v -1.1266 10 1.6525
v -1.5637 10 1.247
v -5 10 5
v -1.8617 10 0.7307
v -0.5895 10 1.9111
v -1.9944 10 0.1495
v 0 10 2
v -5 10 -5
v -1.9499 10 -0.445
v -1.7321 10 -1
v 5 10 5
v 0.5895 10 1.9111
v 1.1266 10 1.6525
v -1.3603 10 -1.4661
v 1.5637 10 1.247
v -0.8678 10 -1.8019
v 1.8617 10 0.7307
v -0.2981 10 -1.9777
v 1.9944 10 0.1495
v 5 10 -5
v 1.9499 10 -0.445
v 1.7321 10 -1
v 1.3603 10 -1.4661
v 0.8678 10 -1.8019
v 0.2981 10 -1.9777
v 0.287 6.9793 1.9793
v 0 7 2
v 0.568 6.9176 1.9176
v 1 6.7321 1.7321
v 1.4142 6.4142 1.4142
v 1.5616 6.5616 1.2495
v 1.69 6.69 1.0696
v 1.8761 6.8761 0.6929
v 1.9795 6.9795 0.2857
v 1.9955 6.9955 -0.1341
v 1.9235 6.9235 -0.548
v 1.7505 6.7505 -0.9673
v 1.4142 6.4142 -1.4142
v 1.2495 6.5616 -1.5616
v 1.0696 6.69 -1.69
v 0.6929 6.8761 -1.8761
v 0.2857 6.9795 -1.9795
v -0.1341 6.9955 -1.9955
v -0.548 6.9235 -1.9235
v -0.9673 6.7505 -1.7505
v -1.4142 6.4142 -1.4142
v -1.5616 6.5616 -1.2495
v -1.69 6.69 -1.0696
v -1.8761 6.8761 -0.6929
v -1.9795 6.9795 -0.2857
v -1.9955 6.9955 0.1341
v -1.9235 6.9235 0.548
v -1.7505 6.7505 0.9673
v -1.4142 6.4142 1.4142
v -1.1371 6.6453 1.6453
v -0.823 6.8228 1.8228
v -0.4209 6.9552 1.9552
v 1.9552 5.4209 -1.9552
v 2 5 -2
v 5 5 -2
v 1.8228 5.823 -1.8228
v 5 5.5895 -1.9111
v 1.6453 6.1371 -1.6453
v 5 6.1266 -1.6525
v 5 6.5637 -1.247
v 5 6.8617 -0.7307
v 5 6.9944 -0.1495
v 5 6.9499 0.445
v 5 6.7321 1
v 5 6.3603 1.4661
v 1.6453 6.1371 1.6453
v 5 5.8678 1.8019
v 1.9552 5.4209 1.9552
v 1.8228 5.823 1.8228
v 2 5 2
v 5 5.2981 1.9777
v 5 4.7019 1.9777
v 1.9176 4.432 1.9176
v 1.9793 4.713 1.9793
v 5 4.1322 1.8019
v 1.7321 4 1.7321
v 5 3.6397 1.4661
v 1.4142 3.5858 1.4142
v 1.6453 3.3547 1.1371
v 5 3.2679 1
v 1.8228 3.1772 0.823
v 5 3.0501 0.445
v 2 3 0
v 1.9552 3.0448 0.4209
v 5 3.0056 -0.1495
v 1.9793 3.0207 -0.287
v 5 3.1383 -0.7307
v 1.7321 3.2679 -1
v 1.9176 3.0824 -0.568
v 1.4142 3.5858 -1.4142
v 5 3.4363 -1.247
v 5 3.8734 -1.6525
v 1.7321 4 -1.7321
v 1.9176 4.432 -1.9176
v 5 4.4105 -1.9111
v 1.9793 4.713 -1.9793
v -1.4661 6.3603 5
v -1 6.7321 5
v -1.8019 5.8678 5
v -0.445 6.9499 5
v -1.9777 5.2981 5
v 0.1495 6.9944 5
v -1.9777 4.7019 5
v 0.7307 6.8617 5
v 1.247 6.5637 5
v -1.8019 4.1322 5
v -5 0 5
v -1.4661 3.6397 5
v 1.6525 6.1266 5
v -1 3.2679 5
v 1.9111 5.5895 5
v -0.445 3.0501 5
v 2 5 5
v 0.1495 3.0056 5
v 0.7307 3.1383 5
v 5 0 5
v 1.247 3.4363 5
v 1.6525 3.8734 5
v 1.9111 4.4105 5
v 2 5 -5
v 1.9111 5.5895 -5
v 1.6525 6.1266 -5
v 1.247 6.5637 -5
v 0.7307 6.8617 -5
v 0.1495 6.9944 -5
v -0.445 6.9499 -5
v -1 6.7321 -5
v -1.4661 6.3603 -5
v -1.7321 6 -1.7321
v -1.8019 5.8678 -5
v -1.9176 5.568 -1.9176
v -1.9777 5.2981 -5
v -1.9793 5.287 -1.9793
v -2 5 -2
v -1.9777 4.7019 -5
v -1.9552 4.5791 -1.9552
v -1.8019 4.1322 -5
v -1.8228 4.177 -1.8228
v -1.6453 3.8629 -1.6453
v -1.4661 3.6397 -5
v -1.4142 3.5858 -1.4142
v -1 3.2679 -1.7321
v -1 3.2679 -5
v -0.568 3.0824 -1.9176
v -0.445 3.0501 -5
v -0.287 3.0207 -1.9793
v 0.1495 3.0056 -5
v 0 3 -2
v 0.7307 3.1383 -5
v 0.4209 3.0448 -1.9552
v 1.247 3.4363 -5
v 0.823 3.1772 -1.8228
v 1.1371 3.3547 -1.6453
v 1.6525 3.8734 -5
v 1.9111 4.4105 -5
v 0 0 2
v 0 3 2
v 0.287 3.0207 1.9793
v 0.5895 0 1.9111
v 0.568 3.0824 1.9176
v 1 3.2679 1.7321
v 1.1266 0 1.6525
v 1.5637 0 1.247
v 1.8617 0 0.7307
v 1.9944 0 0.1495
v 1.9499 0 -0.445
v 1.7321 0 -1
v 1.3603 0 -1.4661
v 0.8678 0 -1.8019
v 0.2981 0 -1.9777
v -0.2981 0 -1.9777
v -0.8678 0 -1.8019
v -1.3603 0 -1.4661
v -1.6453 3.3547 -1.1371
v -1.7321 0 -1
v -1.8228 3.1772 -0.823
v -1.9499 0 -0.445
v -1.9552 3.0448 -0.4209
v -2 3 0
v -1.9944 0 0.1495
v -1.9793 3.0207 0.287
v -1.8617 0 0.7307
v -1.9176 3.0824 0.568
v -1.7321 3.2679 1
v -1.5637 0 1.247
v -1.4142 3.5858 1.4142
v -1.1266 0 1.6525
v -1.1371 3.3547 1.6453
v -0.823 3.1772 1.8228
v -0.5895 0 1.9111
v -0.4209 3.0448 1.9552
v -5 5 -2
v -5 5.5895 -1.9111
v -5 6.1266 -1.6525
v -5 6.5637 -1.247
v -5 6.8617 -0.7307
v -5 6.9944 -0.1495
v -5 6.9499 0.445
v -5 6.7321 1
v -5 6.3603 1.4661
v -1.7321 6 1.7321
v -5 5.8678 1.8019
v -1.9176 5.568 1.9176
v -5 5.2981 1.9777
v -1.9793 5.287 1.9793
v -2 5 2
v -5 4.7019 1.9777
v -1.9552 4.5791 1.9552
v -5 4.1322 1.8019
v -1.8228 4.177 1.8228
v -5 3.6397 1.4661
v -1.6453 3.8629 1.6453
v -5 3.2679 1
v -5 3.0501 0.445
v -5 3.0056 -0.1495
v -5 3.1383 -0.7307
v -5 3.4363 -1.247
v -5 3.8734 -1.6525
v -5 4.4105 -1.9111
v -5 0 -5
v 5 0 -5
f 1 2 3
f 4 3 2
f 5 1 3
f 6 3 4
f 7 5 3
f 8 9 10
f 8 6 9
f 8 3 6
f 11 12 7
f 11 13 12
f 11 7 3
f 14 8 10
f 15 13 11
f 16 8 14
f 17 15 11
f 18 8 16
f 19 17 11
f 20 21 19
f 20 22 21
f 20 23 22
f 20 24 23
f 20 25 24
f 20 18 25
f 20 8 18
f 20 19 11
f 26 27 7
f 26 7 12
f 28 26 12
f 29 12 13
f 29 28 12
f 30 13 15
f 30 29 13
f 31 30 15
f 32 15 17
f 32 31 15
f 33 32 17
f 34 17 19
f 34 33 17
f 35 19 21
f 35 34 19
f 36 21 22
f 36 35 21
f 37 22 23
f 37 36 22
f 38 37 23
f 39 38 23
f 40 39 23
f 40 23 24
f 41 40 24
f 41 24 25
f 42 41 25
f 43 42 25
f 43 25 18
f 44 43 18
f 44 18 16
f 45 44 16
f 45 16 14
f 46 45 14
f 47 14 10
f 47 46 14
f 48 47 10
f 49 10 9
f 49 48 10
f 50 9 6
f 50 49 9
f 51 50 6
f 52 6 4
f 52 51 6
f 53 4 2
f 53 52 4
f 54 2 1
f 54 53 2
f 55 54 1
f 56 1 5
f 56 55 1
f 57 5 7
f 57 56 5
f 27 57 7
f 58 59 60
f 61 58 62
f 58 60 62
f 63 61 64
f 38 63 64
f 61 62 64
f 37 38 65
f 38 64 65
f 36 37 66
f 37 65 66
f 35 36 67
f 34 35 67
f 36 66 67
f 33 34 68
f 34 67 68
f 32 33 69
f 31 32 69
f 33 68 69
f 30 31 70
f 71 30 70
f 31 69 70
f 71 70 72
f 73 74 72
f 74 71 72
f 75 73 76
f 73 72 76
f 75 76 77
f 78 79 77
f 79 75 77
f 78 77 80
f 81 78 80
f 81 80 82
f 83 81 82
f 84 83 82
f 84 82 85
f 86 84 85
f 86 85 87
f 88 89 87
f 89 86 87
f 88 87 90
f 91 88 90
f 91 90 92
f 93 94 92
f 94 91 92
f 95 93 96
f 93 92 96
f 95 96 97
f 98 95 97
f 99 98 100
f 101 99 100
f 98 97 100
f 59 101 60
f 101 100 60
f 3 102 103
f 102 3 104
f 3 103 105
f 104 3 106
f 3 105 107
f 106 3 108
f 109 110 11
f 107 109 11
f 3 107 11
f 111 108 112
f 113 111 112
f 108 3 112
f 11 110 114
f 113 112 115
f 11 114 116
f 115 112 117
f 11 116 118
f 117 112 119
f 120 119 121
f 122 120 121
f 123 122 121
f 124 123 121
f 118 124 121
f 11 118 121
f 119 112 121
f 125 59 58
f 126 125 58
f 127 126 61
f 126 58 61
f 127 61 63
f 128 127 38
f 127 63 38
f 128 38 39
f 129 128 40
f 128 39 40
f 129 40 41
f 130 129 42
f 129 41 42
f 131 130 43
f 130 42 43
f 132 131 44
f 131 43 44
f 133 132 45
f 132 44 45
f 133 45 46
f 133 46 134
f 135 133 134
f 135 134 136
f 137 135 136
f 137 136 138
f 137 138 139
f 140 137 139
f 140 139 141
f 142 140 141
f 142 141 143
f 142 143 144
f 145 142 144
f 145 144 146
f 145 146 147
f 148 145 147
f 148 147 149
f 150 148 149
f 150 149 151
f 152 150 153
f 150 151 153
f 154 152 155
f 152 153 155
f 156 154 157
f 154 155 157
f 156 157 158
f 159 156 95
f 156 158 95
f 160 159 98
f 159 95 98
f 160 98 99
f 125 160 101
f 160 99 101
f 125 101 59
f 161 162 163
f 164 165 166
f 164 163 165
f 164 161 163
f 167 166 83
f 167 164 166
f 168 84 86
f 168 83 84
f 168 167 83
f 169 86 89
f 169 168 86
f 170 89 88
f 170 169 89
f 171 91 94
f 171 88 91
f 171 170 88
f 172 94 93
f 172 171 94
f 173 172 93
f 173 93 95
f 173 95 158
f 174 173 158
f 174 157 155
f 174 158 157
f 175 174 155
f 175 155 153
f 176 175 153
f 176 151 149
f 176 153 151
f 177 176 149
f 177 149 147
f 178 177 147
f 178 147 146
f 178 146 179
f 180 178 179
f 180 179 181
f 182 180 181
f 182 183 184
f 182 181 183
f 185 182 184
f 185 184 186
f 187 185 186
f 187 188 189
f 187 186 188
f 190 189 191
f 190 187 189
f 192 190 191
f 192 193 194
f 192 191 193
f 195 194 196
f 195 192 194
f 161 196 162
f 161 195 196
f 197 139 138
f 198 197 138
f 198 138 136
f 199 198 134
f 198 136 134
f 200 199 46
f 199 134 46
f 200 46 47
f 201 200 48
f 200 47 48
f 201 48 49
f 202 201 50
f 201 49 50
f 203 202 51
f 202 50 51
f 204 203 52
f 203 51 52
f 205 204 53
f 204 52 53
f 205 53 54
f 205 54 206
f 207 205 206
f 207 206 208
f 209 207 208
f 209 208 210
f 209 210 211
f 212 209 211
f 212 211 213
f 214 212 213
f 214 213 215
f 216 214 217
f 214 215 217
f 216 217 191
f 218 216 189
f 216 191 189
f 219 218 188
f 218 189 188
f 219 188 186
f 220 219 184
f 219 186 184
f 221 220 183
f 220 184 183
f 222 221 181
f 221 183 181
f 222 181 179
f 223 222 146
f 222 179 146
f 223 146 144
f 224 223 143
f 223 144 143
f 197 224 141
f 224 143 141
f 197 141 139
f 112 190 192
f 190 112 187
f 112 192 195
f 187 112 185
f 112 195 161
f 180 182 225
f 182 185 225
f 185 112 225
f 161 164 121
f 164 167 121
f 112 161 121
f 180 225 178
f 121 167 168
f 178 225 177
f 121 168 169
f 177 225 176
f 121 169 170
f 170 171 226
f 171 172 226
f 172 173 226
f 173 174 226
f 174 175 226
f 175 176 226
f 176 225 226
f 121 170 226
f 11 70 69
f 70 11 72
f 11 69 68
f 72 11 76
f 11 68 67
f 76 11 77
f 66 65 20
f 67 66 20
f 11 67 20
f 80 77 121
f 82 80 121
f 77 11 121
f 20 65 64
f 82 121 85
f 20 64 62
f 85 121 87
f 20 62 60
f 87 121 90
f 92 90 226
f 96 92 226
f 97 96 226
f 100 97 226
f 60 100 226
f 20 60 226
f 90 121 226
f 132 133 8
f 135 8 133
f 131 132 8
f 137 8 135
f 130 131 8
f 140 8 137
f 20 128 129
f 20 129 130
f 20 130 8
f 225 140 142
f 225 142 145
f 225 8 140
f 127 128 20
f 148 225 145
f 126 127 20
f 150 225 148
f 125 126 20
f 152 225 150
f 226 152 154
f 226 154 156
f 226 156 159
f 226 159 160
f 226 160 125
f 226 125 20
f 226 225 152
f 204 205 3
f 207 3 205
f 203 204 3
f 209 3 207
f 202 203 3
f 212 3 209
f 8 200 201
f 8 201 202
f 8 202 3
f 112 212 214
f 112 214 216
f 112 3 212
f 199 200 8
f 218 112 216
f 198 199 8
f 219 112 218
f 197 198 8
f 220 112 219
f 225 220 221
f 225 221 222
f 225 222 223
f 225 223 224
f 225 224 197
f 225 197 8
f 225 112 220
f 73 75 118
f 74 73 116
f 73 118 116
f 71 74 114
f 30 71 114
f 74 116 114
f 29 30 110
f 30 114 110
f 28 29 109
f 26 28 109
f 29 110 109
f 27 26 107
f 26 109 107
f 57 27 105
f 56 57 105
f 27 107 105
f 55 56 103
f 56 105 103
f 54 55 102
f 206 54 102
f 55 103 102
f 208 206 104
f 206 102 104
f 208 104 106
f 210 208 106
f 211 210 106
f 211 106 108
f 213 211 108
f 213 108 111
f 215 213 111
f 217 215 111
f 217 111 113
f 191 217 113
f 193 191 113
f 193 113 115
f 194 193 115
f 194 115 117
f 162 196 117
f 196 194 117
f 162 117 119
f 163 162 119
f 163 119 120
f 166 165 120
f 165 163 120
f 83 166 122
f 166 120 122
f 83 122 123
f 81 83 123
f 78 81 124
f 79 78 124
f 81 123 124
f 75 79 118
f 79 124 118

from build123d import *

# Parameters (mm, degrees)
SKETCH_1_W          = 10
SKETCH_1_H          = 10
SKETCH_1_R          = 2
EXTRUDE_1_DEPTH     = 10
SKETCH_2_R          = 2
CUT_EXTRUDE_1_DEPTH = 10
SKETCH_3_R          = 2
CUT_EXTRUDE_2_DEPTH = 10


with BuildPart() as part:
    # 草图1 → 凸台-拉伸1 (new body)
    with BuildSketch(Plane(origin=(0, 0, 0), x_dir=(1, 0, 0), z_dir=(0, 1, 0))):
        Rectangle(SKETCH_1_W, SKETCH_1_H)
        with Locations(Location((0, 0, 0), (0, 0, 270))):
            Circle(SKETCH_1_R, mode=Mode.SUBTRACT)
    extrude(amount=EXTRUDE_1_DEPTH)

    # 草图2 → 切除-拉伸1 (cut)
    with BuildSketch(Plane.XY.offset(5)):
        with Locations((0, 5)):
            Circle(SKETCH_2_R)
    extrude(amount=-CUT_EXTRUDE_1_DEPTH, mode=Mode.SUBTRACT)

    # 草图3 → 切除-拉伸2 (cut)
    with BuildSketch(Plane(origin=(5, 0, 0), x_dir=(0, 0, -1), z_dir=(1, 0, 0))):
        with Locations((0, 5)):
            Circle(SKETCH_3_R)
    extrude(amount=-CUT_EXTRUDE_2_DEPTH, mode=Mode.SUBTRACT)


solid = part.part
